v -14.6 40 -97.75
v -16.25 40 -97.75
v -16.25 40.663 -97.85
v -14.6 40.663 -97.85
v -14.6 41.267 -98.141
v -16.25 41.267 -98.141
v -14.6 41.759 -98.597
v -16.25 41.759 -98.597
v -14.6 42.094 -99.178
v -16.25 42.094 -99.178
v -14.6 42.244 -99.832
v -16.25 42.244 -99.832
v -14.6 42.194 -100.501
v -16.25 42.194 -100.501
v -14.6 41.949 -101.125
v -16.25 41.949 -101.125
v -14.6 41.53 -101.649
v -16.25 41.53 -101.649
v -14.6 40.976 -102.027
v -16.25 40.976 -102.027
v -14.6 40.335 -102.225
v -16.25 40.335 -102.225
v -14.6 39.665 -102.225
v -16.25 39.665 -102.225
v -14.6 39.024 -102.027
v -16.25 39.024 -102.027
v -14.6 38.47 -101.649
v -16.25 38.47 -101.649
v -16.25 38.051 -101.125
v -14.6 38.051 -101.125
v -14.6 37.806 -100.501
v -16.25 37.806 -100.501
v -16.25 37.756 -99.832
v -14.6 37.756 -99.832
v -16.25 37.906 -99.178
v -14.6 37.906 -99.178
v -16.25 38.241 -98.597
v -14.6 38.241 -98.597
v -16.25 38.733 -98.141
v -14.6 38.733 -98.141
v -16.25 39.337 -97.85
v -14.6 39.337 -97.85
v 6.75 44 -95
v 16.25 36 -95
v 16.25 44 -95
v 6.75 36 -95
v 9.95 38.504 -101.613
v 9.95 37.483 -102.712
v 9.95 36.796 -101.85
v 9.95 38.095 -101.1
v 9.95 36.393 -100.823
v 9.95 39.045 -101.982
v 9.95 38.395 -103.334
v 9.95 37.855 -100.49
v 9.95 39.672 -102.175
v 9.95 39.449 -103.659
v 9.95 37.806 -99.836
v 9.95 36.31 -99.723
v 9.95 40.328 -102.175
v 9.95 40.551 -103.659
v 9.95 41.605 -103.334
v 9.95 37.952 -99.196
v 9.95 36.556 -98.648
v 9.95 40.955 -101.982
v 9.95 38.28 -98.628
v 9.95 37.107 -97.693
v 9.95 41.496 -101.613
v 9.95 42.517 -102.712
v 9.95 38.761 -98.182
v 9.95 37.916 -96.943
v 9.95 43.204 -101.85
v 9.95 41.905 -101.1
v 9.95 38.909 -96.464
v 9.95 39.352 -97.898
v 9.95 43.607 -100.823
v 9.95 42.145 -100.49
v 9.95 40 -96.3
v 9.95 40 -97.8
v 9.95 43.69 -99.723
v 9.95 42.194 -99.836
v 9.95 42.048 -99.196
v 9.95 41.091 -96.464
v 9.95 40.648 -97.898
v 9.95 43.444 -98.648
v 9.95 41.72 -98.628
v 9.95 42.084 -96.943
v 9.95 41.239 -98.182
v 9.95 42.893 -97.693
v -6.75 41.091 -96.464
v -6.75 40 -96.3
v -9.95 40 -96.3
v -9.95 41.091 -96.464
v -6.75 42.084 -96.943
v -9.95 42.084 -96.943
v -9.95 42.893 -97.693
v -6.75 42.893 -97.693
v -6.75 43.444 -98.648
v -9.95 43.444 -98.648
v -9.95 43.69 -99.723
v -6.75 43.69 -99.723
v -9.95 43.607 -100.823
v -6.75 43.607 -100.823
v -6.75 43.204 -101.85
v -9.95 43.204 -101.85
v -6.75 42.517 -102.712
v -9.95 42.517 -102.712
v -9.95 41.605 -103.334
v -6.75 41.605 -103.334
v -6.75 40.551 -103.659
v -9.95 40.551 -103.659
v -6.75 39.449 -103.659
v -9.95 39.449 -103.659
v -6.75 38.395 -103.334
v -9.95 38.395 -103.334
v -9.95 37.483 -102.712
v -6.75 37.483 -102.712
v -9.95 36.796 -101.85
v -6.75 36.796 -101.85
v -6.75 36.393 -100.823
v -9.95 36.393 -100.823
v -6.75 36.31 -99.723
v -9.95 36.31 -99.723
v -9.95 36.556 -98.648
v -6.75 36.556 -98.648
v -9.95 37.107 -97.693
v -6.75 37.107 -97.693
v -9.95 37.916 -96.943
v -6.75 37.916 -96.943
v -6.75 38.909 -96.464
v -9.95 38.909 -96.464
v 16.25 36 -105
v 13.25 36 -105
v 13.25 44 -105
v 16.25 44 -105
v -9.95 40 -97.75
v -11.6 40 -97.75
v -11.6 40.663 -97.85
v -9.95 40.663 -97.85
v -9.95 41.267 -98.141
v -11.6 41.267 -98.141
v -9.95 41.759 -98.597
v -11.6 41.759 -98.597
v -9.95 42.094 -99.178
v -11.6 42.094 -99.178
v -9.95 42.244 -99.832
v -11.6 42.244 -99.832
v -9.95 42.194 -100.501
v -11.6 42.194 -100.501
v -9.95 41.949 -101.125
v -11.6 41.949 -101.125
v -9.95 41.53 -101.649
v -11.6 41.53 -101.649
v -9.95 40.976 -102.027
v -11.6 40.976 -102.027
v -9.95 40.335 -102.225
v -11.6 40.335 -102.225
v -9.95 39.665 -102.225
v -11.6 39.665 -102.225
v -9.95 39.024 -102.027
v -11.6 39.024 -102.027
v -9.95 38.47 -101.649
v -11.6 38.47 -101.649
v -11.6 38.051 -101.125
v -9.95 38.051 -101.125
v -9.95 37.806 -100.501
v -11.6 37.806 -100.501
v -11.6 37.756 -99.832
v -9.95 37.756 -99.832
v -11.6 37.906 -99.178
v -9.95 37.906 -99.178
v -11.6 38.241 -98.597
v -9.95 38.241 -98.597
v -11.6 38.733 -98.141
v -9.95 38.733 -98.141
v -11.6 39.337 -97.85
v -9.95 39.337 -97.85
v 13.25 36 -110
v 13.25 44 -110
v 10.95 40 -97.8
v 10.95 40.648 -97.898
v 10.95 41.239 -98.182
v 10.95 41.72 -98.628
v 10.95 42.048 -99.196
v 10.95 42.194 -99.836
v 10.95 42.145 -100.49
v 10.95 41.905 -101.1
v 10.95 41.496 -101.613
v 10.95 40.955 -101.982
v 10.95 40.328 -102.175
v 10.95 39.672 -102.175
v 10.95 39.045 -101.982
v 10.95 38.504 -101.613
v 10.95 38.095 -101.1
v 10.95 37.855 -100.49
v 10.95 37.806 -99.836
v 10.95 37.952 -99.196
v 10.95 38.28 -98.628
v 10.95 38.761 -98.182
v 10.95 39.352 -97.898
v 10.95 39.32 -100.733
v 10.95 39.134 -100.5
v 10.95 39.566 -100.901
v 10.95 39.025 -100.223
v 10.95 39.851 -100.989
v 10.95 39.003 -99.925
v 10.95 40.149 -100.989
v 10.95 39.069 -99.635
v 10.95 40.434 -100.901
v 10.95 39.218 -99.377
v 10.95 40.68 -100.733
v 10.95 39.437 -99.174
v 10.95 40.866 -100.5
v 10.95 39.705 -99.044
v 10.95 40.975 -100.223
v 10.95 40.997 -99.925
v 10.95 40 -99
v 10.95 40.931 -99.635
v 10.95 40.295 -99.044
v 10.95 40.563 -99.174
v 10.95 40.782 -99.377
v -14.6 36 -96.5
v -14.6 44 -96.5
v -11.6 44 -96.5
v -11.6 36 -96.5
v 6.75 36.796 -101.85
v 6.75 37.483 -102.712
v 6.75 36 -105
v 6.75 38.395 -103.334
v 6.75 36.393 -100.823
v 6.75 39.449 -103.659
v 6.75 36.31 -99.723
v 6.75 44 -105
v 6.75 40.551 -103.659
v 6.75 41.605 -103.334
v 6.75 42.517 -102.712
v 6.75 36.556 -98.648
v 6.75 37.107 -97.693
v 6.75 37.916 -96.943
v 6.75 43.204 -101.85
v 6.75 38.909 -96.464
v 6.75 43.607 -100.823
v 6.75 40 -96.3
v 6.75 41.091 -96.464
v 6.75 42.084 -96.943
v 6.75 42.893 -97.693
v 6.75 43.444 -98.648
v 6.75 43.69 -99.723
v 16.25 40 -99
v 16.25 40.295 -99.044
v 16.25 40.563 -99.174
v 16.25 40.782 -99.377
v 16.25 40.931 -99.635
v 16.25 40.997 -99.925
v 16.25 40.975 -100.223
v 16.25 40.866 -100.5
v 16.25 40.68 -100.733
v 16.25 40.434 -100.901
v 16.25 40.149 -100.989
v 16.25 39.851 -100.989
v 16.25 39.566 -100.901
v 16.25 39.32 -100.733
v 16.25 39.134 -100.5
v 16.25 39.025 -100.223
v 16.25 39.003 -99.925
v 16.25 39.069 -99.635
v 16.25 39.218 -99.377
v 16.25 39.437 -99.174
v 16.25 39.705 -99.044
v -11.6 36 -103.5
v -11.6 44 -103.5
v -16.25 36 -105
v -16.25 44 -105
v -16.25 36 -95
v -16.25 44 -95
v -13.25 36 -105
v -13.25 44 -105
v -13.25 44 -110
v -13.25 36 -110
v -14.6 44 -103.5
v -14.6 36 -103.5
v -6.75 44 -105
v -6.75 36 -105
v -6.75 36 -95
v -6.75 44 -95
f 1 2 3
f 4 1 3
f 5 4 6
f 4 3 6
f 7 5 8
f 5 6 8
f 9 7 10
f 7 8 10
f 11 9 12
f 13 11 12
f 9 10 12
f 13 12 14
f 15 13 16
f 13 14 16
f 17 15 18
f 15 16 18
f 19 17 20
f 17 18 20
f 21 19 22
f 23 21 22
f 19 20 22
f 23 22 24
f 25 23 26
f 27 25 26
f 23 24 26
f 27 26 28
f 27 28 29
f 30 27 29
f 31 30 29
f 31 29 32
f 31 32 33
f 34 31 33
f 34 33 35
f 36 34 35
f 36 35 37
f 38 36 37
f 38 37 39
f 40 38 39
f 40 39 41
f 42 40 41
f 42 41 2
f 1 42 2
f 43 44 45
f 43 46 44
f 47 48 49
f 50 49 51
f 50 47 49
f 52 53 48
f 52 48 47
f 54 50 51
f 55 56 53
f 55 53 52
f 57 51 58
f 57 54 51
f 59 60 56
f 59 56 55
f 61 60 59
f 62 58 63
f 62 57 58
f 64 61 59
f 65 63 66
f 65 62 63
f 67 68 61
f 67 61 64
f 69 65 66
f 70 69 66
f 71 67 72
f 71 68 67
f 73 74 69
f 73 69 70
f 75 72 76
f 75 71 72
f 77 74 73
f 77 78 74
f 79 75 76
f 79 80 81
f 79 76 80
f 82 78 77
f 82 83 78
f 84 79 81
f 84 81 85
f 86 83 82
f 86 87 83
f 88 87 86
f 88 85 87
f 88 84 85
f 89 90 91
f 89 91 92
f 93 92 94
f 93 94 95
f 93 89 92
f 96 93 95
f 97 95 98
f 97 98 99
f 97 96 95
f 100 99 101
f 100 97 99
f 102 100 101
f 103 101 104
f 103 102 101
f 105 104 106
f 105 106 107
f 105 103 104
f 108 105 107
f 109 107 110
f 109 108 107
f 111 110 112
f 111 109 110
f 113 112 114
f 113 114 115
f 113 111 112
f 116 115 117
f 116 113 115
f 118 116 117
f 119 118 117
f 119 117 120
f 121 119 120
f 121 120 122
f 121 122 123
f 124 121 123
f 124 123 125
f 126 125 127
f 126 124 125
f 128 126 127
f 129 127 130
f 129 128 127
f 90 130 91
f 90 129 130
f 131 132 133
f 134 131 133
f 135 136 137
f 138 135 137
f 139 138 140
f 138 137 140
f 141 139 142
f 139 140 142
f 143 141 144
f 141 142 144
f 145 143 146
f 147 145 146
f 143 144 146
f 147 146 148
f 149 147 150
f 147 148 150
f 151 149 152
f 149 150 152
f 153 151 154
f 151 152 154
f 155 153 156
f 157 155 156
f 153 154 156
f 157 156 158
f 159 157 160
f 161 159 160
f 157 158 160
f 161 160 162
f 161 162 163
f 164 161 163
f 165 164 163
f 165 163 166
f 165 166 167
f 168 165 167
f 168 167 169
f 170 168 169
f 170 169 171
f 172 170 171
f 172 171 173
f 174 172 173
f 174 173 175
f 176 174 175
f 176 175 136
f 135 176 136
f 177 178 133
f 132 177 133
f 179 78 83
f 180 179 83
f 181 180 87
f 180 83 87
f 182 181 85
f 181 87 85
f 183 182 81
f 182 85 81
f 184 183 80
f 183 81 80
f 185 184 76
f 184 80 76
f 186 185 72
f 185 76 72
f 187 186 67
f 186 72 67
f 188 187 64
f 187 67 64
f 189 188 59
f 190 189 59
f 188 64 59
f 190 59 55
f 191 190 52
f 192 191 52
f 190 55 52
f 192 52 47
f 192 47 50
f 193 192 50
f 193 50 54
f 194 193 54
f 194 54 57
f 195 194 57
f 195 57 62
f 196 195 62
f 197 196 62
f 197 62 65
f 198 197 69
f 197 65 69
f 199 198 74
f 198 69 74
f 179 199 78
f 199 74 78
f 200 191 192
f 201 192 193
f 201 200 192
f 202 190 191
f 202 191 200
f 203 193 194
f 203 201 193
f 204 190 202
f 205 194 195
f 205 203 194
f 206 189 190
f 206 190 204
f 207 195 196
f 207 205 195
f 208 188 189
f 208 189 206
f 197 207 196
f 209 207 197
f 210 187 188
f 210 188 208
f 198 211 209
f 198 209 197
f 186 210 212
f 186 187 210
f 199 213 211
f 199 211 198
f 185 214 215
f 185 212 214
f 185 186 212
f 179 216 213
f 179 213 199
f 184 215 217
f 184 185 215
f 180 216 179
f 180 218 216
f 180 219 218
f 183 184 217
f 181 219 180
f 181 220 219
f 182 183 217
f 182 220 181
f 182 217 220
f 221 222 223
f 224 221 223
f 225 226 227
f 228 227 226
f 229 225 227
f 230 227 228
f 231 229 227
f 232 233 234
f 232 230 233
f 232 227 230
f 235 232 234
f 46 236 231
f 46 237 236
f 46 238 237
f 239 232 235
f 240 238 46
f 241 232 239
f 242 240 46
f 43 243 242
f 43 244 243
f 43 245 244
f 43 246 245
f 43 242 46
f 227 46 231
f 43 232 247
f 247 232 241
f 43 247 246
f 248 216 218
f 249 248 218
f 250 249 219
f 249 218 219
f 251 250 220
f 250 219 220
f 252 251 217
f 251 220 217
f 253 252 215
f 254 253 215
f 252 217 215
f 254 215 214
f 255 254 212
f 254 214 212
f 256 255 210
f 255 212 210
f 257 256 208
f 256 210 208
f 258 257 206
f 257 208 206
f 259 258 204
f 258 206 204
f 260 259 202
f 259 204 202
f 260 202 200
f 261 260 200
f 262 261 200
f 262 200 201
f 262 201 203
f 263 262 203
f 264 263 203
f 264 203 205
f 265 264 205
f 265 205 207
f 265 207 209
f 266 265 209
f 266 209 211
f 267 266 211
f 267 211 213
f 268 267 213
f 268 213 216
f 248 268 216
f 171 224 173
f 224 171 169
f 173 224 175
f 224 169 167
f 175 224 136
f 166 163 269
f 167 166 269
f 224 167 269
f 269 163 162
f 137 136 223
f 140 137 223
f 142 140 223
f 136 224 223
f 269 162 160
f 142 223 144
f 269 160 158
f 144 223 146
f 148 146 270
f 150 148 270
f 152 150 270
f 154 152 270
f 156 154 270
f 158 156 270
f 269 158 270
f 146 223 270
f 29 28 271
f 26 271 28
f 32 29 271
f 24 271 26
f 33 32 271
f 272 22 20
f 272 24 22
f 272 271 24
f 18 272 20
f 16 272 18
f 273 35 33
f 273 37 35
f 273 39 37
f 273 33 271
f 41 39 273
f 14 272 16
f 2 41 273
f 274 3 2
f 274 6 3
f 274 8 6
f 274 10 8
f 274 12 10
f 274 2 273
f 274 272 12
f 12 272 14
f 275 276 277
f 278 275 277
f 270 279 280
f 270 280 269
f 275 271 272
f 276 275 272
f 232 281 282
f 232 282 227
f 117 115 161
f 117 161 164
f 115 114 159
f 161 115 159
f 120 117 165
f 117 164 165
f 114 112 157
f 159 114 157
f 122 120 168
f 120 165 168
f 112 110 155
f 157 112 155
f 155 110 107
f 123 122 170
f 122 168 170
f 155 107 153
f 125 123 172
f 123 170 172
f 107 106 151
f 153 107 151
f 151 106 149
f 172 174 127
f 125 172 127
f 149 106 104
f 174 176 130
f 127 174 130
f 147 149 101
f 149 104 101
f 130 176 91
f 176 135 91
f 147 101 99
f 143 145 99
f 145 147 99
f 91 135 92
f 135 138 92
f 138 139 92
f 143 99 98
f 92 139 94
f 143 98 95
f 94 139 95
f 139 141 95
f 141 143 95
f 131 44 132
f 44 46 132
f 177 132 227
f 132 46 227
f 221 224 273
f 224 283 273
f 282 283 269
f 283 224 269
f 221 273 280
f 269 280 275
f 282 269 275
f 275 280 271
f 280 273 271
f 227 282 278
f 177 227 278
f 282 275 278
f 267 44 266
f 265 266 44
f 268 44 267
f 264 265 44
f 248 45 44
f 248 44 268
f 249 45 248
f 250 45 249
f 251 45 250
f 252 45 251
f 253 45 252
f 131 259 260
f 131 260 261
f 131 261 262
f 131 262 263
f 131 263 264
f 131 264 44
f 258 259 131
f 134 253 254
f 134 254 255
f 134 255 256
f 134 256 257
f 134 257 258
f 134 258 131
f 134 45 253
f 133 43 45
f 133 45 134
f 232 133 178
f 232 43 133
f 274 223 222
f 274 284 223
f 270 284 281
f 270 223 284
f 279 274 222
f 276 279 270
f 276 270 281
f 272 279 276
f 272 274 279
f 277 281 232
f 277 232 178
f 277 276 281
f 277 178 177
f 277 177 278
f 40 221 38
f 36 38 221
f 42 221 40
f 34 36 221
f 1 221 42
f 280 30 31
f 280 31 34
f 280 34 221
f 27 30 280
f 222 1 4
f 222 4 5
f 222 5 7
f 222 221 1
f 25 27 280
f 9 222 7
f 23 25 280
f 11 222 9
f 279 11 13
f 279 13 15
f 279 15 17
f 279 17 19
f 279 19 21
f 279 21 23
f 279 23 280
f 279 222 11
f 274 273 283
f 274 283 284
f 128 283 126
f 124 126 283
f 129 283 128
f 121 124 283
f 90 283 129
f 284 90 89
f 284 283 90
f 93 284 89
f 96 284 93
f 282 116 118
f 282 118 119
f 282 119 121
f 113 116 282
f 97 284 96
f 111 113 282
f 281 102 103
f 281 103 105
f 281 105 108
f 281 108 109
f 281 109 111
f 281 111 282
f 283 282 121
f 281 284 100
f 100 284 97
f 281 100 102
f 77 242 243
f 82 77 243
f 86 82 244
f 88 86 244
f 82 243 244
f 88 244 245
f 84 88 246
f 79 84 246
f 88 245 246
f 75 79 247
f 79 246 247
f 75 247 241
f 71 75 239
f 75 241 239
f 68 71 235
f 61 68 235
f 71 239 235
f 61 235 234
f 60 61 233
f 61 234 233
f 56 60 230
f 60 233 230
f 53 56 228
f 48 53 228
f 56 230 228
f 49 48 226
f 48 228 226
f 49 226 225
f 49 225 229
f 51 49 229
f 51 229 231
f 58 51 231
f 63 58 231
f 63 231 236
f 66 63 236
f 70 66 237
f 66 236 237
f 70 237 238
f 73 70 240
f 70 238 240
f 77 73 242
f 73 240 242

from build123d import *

# Parameters (mm, degrees)
SHAPE_DEPTH                   = 4
SHAPE_DEPTH_BACK              = 4
ESQUISSE19_R                  = 2.25
HOLEAXE_MOTOR_DEPTH           = 13
ESQUISSE20_R                  = 3.7
HOLEBEARING_MOTOR_DEPTH       = 3.2
ESQUISSE21_R                  = 2.2
ENTRETOISEBEARING_MOTOR_DEPTH = 1
EXT_MOTOR_START               = 3
ESQUISSE22_W                  = 10
ESQUISSE22_H                  = 8
ESQUISSE22_R                  = 2.25
EXT_MOTOR_DEPTH               = 3
ESQUISSE23_W                  = 3
ESQUISSE23_H                  = 7
HOLESCREWLESS_MOTOR_DEPTH     = 10
ESQUISSE24_W                  = 10
ESQUISSE24_H                  = 8
BOSS_EXTRU_1_DEPTH            = 3
ESQUISSE25_R                  = 1
REMOVE_HELPER_DEPTH           = 10


with BuildPart() as part:
    # Esquisse17 → Shape (new, two sides: drawn at the far end of the back side and taken through both)
    with BuildSketch(Plane(origin=(0, 40, 0), x_dir=(-1, 0, 0), z_dir=(0, -1, 0)).offset(-SHAPE_DEPTH_BACK)):
        Polygon((13.25, 105), (13.25, 95), (6.75, 95), (6.75, 105), (-6.75, 105), (-6.75, 95), (-13.25, 95), (-13.25, 105), (-13.25, 110), (13.25, 110), align=None)
    extrude(amount=SHAPE_DEPTH + SHAPE_DEPTH_BACK)

    # Esquisse19 → HoleAxe_motor (cut)
    with BuildSketch(Plane.ZY.offset(13.25)):
        with Locations((-100, 40)):
            Circle(ESQUISSE19_R)
    extrude(amount=-HOLEAXE_MOTOR_DEPTH, mode=Mode.SUBTRACT)

    # Esquisse20 → HoleBearing_motor (cut)
    with BuildSketch(Plane.ZY.offset(-6.75)):
        with Locations((-100, 40)):
            Circle(ESQUISSE20_R)
    holebearing_motor = extrude(amount=-HOLEBEARING_MOTOR_DEPTH, mode=Mode.SUBTRACT)

    # Symétrie3: HoleBearing_motor across plane
    add(holebearing_motor.mirror(Plane(origin=(0, 0, 0), x_dir=(0, 0, 1), z_dir=(1, 0, 0))), mode=Mode.SUBTRACT)

    # Esquisse21 → entretoiseBearing_motor (cut)
    with BuildSketch(Plane.ZY.offset(-9.95)):
        with Locations((-100, 40)):
            Circle(ESQUISSE21_R)
    extrude(amount=-ENTRETOISEBEARING_MOTOR_DEPTH, mode=Mode.SUBTRACT)

    # Esquisse22 → Ext_motor (add)
    with BuildSketch(Plane.ZY.offset(13.25).offset(EXT_MOTOR_START)):
        with Locations((-100, 40)):
            Rectangle(ESQUISSE22_W, ESQUISSE22_H)
        with Locations((-100, 40)):
            Circle(ESQUISSE22_R, mode=Mode.SUBTRACT)
    extrude(amount=-EXT_MOTOR_DEPTH)

    # Esquisse23 → HoleScrewLess_motor (cut)
    with BuildSketch(Plane(origin=(0, 44, 0), x_dir=(1, 0, 0), z_dir=(0, 1, 0))):
        with Locations((-13.1, 100)):
            Rectangle(ESQUISSE23_W, ESQUISSE23_H)
    extrude(amount=-HOLESCREWLESS_MOTOR_DEPTH, mode=Mode.SUBTRACT)

    # Esquisse24 → Boss.-Extru.1 (add)
    with BuildSketch(Plane(origin=(13.25, 0, 0), x_dir=(0, 0, -1), z_dir=(1, 0, 0))):
        with Locations((100, 40)):
            Rectangle(ESQUISSE24_W, ESQUISSE24_H)
    extrude(amount=BOSS_EXTRU_1_DEPTH)

    # Esquisse25 → Remove helper (cut)
    with BuildSketch(Plane.ZY.offset(-10.95)):
        with Locations((-100, 40)):
            Circle(ESQUISSE25_R)
    extrude(amount=-REMOVE_HELPER_DEPTH, mode=Mode.SUBTRACT)


solid = part.part
